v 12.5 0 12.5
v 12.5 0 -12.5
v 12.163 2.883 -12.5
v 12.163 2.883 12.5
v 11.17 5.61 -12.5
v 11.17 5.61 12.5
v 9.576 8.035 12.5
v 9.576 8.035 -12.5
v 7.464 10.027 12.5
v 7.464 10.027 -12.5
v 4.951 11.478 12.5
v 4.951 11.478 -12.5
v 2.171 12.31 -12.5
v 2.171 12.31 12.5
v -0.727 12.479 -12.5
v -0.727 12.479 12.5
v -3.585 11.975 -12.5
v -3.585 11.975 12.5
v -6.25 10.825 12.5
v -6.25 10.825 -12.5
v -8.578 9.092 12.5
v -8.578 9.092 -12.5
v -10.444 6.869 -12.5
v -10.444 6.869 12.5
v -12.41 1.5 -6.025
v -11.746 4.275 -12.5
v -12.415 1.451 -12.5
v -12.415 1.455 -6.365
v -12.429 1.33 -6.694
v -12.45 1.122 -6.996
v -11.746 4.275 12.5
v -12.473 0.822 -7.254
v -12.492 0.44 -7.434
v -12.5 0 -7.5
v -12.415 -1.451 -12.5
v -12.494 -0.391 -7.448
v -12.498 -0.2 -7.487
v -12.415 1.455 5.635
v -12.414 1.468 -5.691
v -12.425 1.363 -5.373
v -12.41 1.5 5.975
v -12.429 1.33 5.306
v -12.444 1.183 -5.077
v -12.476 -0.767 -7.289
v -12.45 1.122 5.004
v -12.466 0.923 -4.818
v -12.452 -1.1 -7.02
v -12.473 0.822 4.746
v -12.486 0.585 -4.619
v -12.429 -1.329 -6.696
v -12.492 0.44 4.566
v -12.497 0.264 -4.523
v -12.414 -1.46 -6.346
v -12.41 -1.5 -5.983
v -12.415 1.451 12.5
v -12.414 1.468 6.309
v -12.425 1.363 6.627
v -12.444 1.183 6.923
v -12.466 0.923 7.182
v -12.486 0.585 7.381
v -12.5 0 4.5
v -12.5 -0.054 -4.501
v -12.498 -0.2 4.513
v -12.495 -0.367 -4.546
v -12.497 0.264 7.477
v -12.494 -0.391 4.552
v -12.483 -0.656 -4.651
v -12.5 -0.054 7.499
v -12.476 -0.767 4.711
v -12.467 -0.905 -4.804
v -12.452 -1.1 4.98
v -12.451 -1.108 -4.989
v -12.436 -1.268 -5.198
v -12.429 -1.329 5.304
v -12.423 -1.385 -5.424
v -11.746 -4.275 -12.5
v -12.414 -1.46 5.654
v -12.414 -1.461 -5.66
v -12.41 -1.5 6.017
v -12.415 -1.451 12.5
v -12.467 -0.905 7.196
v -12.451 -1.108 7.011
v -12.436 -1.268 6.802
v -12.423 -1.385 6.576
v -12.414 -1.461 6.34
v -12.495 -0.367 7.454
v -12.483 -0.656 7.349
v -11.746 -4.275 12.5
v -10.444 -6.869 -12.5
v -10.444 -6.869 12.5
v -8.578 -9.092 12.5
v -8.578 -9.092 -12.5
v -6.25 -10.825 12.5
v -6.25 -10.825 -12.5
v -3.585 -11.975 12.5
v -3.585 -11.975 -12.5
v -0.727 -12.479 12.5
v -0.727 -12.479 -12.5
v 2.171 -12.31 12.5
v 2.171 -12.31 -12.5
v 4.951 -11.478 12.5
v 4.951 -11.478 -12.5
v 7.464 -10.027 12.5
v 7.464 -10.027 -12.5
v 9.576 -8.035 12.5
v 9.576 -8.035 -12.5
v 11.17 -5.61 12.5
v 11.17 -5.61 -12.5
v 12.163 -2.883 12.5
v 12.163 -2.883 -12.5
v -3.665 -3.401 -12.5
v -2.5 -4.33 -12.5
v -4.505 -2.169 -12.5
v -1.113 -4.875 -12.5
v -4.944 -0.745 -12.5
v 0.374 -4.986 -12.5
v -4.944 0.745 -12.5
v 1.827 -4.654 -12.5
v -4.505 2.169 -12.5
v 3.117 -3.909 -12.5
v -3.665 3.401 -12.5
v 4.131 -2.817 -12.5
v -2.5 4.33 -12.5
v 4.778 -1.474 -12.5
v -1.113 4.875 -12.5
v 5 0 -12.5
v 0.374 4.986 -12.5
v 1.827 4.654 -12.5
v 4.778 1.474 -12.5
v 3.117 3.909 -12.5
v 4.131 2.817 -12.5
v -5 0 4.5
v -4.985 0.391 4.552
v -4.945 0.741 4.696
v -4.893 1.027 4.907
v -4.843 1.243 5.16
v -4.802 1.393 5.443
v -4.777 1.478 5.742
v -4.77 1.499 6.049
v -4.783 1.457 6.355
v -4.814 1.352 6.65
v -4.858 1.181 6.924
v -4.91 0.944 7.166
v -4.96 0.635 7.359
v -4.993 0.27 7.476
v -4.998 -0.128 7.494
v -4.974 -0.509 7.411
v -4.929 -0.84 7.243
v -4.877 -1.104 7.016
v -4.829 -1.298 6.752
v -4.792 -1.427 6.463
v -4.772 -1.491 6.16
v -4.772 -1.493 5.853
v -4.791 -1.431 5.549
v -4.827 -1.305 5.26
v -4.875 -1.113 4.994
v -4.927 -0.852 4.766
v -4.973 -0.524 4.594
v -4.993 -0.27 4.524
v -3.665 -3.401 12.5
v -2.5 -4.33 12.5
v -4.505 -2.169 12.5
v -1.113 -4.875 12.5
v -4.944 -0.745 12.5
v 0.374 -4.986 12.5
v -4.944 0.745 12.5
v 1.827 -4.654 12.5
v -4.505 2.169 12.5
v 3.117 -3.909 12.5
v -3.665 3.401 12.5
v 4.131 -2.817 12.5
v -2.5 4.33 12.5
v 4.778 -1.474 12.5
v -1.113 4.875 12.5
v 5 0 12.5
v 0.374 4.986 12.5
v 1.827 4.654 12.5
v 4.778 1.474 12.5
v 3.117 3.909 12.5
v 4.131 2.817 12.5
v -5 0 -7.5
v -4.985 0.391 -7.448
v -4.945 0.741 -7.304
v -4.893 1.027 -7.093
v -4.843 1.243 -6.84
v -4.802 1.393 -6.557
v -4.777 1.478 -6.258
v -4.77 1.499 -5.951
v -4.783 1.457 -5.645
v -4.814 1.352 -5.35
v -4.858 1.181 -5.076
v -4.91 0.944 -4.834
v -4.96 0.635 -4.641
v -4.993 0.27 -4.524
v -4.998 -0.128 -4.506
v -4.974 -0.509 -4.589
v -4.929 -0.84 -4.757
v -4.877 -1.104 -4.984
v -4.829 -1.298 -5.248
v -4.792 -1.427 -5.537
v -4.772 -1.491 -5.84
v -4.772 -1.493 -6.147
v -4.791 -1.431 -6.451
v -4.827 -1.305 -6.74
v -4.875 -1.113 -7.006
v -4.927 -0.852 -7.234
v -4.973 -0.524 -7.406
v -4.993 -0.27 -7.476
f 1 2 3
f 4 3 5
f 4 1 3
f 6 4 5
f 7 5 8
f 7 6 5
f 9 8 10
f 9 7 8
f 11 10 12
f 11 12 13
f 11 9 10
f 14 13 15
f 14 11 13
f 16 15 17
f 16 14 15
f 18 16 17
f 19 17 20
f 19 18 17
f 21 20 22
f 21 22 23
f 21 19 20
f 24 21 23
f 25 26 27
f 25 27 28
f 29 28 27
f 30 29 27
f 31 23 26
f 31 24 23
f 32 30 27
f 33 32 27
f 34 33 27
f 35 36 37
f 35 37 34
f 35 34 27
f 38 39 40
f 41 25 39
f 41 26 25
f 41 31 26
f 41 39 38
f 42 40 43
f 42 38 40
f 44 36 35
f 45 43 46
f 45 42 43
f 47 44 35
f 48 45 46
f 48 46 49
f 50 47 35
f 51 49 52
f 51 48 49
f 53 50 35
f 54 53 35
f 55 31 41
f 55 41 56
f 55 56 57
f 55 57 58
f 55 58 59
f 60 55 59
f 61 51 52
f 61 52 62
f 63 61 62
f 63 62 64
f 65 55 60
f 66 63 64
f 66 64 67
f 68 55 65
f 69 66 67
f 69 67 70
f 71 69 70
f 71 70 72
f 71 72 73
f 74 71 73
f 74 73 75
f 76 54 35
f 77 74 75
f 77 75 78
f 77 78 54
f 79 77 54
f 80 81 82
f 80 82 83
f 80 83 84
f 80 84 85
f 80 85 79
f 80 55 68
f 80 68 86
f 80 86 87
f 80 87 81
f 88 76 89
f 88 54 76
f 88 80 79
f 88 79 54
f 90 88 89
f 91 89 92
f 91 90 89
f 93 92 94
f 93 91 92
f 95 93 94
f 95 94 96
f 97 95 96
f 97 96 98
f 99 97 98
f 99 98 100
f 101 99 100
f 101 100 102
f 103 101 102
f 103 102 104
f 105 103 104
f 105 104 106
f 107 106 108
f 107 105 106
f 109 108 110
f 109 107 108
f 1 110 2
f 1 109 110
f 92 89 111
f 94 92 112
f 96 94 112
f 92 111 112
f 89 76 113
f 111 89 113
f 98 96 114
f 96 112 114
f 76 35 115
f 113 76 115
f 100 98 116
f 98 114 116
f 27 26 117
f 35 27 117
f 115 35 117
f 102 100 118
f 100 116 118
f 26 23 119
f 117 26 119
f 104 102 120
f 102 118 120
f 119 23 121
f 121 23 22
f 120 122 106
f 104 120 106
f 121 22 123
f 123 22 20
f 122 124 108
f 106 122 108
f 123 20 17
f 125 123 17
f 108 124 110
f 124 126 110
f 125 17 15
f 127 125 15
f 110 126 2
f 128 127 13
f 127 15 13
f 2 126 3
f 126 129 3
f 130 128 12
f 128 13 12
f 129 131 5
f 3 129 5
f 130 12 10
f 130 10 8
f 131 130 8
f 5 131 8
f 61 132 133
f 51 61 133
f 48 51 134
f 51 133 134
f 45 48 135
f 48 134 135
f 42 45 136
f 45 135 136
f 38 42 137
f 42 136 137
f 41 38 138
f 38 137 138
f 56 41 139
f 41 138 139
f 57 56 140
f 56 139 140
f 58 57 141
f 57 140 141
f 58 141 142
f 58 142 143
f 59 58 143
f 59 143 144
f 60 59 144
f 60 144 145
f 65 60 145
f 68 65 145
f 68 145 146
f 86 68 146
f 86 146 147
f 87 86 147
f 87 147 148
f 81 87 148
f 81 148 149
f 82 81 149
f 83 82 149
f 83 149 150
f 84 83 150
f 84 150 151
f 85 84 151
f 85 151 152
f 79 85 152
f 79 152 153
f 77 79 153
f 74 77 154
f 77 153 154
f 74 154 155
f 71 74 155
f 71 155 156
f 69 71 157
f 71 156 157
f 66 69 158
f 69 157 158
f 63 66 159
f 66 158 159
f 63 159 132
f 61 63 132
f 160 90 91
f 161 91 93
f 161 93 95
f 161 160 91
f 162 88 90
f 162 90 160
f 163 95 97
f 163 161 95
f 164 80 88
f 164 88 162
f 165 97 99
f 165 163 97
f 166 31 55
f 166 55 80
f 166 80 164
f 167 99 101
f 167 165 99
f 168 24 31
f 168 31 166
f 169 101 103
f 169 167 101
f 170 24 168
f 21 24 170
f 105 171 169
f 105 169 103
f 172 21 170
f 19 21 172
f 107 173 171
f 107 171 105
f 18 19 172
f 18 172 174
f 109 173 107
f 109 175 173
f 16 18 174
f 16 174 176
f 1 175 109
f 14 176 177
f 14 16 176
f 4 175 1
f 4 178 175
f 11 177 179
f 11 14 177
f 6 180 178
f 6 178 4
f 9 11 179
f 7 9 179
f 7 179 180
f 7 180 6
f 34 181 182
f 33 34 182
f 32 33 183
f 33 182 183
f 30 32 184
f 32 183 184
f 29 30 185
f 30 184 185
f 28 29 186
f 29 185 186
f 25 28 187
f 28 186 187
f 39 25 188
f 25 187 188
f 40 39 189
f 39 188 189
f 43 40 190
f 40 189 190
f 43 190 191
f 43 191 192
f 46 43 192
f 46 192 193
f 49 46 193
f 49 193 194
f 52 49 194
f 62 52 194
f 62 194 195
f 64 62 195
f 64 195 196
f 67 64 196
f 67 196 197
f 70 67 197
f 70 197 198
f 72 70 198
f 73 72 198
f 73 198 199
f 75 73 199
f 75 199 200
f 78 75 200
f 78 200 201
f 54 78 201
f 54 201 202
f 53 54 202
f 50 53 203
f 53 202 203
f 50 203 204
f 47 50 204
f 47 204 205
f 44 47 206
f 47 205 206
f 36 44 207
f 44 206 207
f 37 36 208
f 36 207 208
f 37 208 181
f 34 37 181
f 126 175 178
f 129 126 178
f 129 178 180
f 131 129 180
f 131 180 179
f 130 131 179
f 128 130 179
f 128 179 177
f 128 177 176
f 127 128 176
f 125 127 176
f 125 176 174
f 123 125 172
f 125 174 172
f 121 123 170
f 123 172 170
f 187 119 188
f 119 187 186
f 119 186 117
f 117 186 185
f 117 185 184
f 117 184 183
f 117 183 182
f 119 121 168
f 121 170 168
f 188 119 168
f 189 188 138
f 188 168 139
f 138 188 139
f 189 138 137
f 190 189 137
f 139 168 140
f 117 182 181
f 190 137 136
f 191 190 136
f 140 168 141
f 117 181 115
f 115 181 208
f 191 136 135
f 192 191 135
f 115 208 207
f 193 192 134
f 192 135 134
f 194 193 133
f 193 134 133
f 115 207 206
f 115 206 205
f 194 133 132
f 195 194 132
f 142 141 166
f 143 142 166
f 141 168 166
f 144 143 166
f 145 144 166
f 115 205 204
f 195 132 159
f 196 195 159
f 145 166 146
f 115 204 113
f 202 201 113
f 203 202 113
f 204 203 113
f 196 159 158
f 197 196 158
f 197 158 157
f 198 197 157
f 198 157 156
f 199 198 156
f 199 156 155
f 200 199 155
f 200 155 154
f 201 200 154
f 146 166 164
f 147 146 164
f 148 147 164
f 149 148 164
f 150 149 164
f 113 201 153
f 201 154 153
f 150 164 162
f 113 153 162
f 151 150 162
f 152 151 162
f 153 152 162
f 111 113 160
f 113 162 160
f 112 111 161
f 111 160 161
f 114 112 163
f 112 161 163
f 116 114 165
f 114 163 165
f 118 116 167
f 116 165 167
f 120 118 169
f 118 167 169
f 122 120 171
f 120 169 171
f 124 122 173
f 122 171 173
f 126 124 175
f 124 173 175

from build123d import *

# Parameters (mm, degrees)
CROQUIS1_R              = 12.5
SALIENTE_EXTRUIR1_DEPTH = 12.5
CROQUIS2_R              = 5
CORTAR_EXTRUIR1_DEPTH   = 25
CORTAR_EXTRUIR2_REACH   = 14.5
CROQUIS3_R              = 1.5


with BuildPart() as part:
    # Croquis1 → Saliente-Extruir1 (new body, symmetric)
    with BuildSketch(Plane.XY):
        Circle(CROQUIS1_R)
    extrude(amount=SALIENTE_EXTRUIR1_DEPTH, both=True)

    # Croquis2 → Cortar-Extruir1 (cut)
    with BuildSketch(Plane.XY.offset(12.5)):
        Circle(CROQUIS2_R)
    extrude(amount=-CORTAR_EXTRUIR1_DEPTH, mode=Mode.SUBTRACT)

    # Croquis3 → Cortar-Extruir2 (cut, up to next)
    with BuildSketch(Plane(origin=(0, 0, 0), x_dir=(0, 0, -1), z_dir=(1, 0, 0)), mode=Mode.PRIVATE) as cortar_extruir2_sk1:
        with Locations((-6, 0)):
            Circle(CROQUIS3_R)
    cortar_extruir2_tool1 = extrude(cortar_extruir2_sk1.sketch, amount=-CORTAR_EXTRUIR2_REACH, mode=Mode.PRIVATE) & part.part
    add(cortar_extruir2_tool1.solids().sort_by_distance((0, 0, 6))[0], mode=Mode.SUBTRACT)
    # Croquis3 → Cortar-Extruir2 (cut, up to next)
    with BuildSketch(Plane(origin=(0, 0, 0), x_dir=(0, 0, -1), z_dir=(1, 0, 0)), mode=Mode.PRIVATE) as cortar_extruir2_sk2:
        with Locations((6, 0)):
            Circle(CROQUIS3_R)
    cortar_extruir2_tool2 = extrude(cortar_extruir2_sk2.sketch, amount=-CORTAR_EXTRUIR2_REACH, mode=Mode.PRIVATE) & part.part
    add(cortar_extruir2_tool2.solids().sort_by_distance((0, 0, -6))[0], mode=Mode.SUBTRACT)


solid = part.part
